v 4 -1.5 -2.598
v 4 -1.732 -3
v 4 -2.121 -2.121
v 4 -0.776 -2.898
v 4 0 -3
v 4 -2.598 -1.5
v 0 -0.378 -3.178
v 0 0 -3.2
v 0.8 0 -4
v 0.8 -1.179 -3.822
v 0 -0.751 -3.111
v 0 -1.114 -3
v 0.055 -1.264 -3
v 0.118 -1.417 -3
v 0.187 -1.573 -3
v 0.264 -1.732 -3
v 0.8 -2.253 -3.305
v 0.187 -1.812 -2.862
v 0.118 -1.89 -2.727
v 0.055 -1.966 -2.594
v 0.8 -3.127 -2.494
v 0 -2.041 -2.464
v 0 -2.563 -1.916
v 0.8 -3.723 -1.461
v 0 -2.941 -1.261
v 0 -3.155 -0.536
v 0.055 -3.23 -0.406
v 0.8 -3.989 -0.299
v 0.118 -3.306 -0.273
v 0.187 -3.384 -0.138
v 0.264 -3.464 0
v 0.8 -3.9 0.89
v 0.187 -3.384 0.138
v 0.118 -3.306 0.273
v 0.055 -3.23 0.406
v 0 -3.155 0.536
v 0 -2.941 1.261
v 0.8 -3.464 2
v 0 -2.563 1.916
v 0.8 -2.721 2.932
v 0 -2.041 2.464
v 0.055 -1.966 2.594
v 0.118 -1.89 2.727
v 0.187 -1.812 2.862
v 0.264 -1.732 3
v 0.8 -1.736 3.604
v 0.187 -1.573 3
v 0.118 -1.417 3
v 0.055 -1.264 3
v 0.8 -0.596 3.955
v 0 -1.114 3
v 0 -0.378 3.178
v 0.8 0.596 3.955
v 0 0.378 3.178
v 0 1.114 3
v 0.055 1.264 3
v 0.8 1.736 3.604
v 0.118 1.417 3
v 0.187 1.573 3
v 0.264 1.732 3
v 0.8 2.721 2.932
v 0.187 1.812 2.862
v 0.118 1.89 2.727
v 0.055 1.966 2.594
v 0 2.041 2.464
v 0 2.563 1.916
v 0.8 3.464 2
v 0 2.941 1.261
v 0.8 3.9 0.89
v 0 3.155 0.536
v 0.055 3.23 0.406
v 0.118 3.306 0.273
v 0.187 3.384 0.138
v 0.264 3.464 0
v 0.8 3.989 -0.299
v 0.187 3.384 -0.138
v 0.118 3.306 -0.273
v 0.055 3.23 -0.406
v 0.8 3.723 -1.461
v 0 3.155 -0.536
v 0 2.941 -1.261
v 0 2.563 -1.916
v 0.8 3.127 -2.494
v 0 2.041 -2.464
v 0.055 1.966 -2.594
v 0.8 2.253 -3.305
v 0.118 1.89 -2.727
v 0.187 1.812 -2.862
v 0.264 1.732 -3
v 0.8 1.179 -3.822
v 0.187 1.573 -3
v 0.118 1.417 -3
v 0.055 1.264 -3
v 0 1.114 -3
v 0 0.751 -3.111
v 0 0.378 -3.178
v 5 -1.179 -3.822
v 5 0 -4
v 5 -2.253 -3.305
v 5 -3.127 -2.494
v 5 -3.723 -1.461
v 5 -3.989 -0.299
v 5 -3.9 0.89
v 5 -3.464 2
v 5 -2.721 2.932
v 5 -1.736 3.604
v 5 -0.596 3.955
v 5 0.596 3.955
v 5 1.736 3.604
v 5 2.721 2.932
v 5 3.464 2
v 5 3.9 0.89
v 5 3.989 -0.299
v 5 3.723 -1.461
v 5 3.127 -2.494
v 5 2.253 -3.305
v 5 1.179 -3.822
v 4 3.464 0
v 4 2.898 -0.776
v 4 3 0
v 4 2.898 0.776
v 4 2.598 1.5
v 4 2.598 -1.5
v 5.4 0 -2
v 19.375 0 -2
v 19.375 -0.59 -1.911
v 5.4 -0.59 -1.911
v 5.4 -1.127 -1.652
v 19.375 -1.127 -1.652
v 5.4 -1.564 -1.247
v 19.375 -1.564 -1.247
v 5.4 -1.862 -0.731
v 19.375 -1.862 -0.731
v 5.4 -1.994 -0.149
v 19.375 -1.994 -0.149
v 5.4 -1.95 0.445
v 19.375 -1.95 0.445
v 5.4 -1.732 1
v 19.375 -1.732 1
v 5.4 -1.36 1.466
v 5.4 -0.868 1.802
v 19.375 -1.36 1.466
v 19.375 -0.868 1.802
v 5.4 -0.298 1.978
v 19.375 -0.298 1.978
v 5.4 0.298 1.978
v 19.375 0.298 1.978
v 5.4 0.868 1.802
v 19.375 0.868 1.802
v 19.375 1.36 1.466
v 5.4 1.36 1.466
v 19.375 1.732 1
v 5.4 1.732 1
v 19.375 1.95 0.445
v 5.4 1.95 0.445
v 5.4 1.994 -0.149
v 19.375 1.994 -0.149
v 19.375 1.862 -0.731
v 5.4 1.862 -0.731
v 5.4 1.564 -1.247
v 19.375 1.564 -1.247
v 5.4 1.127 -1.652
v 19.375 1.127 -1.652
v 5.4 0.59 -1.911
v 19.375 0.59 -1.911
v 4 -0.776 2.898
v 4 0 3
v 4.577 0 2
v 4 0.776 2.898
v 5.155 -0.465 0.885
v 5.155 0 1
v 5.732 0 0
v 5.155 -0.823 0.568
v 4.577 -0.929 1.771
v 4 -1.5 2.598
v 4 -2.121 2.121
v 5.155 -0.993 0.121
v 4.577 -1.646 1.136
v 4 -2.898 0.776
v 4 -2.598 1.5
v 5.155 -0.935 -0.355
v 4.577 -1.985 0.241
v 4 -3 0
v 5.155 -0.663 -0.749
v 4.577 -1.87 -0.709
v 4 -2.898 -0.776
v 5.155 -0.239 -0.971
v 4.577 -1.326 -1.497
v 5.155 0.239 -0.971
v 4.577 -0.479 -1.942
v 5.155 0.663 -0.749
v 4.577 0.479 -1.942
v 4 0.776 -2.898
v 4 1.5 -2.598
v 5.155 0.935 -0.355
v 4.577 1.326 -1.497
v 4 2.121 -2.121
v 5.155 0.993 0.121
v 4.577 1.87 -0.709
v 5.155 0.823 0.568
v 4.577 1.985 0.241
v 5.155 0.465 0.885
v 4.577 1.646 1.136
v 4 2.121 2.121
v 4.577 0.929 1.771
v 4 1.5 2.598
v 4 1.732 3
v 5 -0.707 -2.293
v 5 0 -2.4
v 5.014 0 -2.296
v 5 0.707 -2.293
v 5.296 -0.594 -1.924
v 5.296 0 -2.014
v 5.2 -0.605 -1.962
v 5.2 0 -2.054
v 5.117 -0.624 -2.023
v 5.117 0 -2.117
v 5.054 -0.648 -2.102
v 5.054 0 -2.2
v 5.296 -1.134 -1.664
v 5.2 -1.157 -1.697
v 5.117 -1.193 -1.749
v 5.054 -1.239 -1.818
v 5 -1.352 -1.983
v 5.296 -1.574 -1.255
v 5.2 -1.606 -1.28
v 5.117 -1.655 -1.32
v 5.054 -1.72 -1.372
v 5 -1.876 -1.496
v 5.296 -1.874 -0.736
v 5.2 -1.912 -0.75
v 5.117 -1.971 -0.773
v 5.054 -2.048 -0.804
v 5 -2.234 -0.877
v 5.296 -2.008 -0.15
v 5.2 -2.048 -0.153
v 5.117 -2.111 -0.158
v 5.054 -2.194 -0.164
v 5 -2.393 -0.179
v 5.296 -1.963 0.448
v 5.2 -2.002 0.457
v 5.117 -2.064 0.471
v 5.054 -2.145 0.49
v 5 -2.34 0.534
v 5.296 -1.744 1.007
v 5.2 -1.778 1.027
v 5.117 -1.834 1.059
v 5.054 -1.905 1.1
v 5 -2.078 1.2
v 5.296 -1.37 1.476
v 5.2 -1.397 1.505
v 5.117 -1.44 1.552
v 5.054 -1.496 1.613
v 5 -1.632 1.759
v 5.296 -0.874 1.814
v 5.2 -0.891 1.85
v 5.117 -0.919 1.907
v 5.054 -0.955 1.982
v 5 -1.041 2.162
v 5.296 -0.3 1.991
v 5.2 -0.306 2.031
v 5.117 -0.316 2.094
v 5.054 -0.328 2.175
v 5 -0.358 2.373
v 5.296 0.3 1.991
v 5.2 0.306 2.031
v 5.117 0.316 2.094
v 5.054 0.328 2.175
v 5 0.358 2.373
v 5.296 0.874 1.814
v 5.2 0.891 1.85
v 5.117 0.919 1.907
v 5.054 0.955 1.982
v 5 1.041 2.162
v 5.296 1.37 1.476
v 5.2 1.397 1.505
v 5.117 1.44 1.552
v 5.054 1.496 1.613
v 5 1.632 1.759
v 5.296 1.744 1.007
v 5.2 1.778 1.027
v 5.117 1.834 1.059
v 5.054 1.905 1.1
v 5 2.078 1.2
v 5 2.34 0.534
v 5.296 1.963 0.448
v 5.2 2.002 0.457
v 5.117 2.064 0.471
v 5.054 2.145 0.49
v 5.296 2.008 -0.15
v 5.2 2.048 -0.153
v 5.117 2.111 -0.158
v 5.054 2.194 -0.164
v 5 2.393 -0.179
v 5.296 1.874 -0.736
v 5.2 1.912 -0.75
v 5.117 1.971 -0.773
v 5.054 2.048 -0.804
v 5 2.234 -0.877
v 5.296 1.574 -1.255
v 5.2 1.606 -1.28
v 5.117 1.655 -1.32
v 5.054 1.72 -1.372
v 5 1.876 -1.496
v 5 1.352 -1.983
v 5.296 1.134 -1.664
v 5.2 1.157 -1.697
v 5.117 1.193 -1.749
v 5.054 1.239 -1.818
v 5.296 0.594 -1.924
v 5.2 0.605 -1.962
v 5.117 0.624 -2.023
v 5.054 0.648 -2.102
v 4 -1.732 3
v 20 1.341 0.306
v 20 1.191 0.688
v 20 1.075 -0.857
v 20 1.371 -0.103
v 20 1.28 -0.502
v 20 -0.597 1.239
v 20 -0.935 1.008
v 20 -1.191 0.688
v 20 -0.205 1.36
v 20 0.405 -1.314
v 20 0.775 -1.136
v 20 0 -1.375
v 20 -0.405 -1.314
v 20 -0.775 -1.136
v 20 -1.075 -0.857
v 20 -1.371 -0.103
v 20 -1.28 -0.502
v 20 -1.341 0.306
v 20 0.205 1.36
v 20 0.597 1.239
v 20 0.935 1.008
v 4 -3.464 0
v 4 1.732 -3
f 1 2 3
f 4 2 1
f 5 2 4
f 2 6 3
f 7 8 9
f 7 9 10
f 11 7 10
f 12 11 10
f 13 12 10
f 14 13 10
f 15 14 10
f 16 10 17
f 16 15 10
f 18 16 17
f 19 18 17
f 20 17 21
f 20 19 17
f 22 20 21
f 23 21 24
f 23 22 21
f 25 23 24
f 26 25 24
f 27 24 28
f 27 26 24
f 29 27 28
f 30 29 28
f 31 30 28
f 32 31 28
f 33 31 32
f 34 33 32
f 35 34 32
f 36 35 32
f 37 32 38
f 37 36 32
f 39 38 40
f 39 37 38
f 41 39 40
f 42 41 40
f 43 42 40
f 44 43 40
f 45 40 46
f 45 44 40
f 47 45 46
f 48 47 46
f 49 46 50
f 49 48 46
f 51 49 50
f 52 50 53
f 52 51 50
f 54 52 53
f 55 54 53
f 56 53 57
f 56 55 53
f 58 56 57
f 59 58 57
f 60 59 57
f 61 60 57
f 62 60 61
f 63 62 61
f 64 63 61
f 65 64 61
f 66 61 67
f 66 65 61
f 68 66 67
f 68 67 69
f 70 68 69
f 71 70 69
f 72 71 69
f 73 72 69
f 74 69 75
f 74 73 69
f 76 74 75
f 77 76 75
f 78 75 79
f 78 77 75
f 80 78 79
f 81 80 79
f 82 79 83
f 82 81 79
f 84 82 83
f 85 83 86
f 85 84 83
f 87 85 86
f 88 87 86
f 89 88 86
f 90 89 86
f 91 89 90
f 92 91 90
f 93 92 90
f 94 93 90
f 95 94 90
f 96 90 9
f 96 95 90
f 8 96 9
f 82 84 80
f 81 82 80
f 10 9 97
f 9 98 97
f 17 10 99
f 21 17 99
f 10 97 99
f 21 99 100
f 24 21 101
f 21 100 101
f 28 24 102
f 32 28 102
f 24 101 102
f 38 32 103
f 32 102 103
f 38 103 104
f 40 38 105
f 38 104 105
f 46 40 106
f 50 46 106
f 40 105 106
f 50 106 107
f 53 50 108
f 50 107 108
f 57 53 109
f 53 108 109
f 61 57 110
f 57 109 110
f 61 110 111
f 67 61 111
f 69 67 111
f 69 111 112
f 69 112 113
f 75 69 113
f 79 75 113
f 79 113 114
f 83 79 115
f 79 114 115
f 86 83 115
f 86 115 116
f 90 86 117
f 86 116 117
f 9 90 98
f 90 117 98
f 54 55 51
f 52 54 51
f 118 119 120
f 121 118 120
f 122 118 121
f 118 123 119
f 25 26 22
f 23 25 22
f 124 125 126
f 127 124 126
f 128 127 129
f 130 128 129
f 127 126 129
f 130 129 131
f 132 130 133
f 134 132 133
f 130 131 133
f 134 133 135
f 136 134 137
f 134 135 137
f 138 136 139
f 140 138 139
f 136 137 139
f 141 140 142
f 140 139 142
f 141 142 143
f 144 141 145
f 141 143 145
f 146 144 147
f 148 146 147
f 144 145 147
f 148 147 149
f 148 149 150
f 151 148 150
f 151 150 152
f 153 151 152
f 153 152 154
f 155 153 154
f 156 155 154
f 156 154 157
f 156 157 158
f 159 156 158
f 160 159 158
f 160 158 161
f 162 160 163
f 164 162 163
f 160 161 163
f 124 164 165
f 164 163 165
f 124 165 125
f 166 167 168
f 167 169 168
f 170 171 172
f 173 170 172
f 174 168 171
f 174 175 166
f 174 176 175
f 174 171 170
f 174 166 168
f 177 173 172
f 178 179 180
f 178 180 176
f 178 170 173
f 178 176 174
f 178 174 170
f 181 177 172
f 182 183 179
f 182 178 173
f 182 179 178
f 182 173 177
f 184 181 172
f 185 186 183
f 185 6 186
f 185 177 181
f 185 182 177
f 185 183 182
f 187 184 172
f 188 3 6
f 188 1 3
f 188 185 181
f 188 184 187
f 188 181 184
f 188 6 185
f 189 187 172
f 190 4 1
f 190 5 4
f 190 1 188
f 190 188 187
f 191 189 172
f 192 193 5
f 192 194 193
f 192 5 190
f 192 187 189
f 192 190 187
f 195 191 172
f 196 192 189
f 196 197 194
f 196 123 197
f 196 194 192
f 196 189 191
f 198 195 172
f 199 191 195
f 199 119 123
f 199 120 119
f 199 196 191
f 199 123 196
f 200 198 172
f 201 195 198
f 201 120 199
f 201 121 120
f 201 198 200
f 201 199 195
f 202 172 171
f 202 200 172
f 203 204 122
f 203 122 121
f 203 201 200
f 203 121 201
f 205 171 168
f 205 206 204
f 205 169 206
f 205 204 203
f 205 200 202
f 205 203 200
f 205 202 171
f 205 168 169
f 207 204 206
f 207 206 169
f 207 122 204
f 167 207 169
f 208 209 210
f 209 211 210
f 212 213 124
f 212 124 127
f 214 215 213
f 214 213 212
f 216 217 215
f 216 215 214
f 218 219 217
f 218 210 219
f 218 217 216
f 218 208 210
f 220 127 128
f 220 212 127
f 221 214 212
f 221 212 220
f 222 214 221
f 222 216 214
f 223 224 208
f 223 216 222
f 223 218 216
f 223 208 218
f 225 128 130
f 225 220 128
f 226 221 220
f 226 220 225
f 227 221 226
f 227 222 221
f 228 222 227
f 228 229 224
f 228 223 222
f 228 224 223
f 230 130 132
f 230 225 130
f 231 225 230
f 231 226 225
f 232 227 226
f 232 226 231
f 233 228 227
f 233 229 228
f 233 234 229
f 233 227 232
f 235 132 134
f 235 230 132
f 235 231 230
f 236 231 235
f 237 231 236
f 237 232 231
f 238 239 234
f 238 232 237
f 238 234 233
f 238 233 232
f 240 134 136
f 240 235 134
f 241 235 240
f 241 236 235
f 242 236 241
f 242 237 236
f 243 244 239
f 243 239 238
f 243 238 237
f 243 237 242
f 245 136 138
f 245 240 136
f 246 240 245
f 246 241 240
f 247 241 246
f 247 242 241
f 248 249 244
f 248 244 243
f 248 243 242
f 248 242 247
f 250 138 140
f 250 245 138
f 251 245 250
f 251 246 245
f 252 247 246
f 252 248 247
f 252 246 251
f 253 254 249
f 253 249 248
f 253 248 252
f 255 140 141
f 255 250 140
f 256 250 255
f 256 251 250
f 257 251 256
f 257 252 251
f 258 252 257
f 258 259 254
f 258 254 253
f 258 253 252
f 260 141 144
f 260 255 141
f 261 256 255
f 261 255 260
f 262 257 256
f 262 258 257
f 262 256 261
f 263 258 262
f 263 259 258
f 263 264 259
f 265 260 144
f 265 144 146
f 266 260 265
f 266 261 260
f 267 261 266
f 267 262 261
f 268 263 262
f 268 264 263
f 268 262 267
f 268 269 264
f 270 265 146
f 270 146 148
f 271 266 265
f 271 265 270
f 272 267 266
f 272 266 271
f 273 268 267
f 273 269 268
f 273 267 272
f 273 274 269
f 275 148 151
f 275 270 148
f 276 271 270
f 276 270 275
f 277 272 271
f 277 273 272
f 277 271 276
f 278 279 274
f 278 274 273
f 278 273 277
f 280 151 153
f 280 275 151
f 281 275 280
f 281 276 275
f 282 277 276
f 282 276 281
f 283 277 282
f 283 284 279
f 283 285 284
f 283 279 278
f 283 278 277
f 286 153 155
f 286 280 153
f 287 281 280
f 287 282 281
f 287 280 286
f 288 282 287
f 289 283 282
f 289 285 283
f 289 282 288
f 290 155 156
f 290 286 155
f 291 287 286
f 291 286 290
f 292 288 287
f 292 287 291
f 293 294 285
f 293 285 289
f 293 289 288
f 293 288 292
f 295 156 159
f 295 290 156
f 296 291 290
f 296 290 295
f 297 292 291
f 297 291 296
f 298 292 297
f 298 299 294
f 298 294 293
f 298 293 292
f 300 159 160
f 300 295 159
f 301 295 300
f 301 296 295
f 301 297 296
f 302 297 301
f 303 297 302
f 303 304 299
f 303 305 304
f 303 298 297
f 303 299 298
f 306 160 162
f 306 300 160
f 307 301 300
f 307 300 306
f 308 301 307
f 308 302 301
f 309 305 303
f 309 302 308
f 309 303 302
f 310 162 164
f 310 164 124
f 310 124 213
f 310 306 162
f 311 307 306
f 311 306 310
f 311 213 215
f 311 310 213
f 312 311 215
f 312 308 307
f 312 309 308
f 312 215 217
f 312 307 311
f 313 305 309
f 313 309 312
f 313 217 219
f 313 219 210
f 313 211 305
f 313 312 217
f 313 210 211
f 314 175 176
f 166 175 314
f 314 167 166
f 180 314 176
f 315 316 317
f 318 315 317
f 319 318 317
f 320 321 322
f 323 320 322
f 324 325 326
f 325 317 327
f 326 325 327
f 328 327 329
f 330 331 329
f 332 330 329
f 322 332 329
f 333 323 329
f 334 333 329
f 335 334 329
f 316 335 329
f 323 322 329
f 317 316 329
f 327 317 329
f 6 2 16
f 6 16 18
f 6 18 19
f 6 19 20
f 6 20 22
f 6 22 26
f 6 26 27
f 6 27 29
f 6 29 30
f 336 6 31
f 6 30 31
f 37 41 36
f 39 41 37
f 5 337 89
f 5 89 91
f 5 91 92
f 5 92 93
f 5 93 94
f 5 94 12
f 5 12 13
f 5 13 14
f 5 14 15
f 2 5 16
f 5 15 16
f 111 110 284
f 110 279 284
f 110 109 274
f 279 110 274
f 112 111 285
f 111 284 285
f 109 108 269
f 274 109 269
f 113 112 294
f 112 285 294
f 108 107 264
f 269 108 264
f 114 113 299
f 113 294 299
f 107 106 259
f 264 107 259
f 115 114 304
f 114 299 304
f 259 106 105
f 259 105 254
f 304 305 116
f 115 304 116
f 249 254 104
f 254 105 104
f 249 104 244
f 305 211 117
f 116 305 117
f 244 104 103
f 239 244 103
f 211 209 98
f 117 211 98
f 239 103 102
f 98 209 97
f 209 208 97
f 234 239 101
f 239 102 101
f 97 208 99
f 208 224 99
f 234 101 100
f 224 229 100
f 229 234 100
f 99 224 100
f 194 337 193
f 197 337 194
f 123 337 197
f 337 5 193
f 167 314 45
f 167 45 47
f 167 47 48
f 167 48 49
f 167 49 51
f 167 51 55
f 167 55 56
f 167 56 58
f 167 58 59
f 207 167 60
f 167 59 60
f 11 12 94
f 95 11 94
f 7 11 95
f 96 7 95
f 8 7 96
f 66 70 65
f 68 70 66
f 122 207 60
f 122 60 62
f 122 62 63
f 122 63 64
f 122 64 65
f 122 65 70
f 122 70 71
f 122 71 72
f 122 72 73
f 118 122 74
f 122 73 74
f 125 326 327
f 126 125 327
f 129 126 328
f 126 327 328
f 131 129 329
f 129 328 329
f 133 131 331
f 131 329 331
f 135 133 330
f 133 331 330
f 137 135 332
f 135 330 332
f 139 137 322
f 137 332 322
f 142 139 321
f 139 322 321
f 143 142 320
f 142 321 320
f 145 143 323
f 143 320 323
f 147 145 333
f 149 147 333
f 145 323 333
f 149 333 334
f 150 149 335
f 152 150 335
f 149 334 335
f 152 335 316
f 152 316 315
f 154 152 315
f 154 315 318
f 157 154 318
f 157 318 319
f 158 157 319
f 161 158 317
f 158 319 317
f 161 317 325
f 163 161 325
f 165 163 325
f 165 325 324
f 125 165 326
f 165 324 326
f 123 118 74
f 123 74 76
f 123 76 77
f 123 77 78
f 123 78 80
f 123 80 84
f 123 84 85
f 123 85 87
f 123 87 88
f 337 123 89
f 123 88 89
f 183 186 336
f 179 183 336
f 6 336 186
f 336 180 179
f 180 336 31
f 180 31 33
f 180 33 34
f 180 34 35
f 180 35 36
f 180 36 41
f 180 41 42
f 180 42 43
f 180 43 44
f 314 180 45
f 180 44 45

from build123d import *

# Parameters (mm, degrees)
CHAMFER1_SIZE      = 0.625
CUT_EXTRUDE1_DEPTH = 4
CHAMFER2_SIZE      = 0.8
FILLET1_R          = 0.4


with BuildPart() as part:
    # Sketch1 → Revolve1 (revolve)
    with BuildSketch(Plane(origin=(0, 0, 0), x_dir=(1, 0, 0), z_dir=(0, 1, 0))):
        Polygon((0, 0), (0, 4), (5, 4), (5, 2), (20, 2), (20, 0), align=None)
    revolve(axis=Axis((20, 0, 0), (-1, 0, 0)))

    # Chamfer1
    chamfer1_edges = [part.edges().sort_by_distance(p)[0] for p in [
        (20, 0, 2),
    ]]
    chamfer(chamfer1_edges, length=CHAMFER1_SIZE)

    # Sketch3 → Cut-Revolve1 (revolve, cut)
    with BuildSketch(Plane(origin=(0, 0, 0), x_dir=(1, 0, 0), z_dir=(0, 1, 0)), mode=Mode.PRIVATE) as cut_revolve1_sk:
        Polygon((0, 0), (5.732050808, 0), (4, 3), (0, 3), align=None)
    revolve(cut_revolve1_sk.sketch.rotate(Axis((0, 0, 0), (1, 0, 0)), 180), axis=Axis((0, 0, 0), (1, 0, 0)), mode=Mode.SUBTRACT)

    # Sketch2 → Cut-Extrude1 (cut)
    with BuildSketch(Plane.ZY):
        Polygon((0, 3.464101615), (-3, 1.732050808), (-3, -1.732050808), (0, -3.464101615), (3, -1.732050808), (3, 1.732050808), align=None)
    extrude(amount=-CUT_EXTRUDE1_DEPTH, mode=Mode.SUBTRACT)

    # Chamfer2
    # the kernel refuses this chamfer: 0.8 mm, written as the material it takes off along each edge
    with BuildSketch(Plane(origin=(0, 0, 0), x_dir=(0, 0, -1), z_dir=(0, 1, 0))) as chamfer2_piece_1:
        Polygon((4, -CHAMFER2_SIZE), (4 - CHAMFER2_SIZE, 0), (4, 0), align=None)
    revolve(axis=Axis((0, 0, 0), (-1, 0, 0)), mode=Mode.SUBTRACT)

    # Fillet1
    fillet1_edges = [part.edges().sort_by_distance(p)[0] for p in [
        (5, 0, 2),
    ]]
    fillet(fillet1_edges, radius=FILLET1_R)


solid = part.part
